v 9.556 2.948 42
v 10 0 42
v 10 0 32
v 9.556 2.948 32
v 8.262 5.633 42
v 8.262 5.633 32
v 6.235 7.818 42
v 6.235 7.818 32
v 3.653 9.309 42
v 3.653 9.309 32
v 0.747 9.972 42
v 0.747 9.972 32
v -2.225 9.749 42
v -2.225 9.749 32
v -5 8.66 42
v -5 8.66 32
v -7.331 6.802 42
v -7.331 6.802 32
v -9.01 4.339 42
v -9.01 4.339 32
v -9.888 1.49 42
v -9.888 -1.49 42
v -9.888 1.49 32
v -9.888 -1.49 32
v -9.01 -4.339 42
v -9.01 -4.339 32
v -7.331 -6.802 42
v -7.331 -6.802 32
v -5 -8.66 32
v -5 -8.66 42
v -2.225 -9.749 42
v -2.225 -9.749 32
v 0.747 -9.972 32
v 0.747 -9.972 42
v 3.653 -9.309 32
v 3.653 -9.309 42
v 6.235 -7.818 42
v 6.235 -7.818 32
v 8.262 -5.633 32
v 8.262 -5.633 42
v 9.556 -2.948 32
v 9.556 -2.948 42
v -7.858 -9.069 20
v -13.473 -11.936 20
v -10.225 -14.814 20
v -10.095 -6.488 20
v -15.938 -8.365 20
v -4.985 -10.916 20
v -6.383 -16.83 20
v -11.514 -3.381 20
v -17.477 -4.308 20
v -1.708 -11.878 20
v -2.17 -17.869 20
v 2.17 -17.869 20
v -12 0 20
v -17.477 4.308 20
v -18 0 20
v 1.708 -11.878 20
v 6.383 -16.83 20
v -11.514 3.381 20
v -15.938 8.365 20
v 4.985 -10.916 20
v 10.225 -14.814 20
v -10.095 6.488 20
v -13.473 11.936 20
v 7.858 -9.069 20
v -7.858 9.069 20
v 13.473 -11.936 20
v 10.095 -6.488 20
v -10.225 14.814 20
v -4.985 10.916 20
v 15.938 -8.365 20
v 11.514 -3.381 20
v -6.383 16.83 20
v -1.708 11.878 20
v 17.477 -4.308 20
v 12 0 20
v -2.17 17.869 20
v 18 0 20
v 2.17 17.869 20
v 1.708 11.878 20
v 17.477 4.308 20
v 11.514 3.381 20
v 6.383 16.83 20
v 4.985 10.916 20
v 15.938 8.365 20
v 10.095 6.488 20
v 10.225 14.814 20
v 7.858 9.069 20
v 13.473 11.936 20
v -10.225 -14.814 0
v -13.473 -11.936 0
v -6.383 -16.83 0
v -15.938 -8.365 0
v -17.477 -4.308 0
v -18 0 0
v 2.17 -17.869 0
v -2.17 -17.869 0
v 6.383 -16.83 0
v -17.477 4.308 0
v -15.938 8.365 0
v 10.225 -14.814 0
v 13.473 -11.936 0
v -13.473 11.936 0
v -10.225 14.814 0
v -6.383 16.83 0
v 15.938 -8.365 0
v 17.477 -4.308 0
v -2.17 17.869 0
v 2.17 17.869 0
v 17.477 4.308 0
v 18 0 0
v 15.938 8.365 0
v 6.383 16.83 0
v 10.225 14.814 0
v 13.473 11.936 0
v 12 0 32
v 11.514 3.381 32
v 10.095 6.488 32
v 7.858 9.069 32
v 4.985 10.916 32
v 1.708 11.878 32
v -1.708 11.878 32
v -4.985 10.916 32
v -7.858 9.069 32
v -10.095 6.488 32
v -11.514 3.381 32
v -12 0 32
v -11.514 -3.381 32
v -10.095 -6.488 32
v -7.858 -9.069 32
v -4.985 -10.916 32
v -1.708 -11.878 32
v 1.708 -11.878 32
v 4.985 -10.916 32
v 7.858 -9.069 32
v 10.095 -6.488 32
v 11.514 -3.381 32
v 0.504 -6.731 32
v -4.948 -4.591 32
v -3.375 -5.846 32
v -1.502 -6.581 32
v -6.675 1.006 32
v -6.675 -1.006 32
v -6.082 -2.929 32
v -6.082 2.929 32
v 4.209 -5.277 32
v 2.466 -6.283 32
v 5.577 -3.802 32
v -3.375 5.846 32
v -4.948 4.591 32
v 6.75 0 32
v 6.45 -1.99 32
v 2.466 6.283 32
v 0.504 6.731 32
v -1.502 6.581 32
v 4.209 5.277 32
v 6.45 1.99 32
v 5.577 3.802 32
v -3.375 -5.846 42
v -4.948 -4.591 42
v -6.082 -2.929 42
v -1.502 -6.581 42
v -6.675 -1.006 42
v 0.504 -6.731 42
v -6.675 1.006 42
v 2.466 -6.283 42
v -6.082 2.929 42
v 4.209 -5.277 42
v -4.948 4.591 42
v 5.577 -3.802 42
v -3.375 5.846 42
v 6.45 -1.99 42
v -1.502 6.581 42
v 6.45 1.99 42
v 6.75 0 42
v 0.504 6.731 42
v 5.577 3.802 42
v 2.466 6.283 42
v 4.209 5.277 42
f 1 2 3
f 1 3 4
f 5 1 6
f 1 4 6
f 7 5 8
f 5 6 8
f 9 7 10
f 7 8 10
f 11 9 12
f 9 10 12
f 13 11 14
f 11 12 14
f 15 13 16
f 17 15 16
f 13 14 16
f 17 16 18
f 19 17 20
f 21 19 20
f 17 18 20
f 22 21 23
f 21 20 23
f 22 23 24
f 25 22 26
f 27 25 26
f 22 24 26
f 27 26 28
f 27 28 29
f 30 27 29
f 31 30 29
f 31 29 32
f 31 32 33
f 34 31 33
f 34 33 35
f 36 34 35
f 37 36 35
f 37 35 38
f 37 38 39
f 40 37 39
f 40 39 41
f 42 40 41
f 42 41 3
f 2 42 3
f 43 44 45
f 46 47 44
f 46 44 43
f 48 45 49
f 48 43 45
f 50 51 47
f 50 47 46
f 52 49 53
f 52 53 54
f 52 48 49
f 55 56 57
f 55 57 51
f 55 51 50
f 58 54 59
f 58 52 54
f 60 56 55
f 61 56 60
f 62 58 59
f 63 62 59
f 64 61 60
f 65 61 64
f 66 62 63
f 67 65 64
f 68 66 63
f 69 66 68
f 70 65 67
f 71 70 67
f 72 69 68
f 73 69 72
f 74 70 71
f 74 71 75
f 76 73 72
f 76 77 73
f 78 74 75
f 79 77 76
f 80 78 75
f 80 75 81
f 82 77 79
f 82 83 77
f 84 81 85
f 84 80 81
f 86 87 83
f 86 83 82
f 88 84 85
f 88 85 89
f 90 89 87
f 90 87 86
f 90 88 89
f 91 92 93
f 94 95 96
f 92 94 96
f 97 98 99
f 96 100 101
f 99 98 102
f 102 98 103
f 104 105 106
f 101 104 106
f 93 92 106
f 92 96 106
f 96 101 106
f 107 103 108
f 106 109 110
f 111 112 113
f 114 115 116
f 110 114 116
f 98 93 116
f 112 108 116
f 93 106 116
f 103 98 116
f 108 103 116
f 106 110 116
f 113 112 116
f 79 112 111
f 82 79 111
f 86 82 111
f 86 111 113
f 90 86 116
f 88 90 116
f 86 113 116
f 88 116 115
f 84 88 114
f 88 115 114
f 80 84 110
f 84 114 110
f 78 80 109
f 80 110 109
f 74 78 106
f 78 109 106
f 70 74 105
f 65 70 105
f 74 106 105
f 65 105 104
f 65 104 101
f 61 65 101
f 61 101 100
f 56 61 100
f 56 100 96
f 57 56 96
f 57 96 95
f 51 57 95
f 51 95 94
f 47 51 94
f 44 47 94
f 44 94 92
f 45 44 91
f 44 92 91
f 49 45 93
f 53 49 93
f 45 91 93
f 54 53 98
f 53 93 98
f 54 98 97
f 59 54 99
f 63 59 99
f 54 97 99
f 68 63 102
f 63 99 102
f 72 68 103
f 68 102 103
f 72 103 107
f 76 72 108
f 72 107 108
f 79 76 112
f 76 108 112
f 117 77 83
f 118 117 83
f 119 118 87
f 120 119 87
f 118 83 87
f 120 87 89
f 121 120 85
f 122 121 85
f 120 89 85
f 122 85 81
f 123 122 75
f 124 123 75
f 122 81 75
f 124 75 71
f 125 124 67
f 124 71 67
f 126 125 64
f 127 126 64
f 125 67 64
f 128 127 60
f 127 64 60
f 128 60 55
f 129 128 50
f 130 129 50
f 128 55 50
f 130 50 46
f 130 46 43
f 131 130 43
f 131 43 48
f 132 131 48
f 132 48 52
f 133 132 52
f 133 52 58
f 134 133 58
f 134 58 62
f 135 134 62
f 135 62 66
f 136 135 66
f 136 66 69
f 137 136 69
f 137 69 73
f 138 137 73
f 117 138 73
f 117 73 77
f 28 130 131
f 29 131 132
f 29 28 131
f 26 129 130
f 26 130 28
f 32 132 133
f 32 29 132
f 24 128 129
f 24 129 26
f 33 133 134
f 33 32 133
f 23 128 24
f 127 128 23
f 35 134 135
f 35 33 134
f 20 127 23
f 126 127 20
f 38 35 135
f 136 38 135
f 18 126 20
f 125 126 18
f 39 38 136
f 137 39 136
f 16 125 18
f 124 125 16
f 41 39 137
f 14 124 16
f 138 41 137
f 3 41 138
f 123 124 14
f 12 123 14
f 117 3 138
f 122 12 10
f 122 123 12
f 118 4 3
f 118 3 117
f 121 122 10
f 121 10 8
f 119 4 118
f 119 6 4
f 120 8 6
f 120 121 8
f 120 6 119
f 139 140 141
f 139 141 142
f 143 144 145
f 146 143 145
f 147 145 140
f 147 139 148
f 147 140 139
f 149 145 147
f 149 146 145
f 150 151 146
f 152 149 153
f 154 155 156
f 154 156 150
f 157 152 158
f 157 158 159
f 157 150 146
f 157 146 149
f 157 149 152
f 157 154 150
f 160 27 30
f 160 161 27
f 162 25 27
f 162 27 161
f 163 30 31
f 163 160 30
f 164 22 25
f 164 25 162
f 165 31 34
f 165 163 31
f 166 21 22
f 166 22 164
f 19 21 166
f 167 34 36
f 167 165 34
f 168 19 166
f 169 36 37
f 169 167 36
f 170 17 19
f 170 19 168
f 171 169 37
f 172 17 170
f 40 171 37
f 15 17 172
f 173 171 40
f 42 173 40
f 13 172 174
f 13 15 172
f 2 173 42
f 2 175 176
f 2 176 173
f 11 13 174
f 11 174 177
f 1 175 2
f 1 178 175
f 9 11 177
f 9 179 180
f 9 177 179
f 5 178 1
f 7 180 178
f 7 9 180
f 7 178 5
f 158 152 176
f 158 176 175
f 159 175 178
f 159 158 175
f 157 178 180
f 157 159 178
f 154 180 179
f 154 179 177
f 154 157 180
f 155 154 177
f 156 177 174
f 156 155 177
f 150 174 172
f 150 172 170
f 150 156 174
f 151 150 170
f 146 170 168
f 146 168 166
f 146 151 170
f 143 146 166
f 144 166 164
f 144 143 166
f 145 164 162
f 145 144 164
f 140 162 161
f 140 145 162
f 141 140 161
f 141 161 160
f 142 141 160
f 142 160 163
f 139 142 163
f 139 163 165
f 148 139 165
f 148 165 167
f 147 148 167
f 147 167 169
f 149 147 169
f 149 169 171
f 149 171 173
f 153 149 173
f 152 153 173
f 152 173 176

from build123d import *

# Parameters (mm, degrees)
F0_R     = 10
F0_R_2   = 6.75
F1_DEPTH = 42
F0_R_3   = 12
F2_DEPTH = 32
F0_R_4   = 18
F3_DEPTH = 20


with BuildPart() as f1:
    # F0 (on Top) → F1 (new body)
    with BuildSketch(Plane.XY):
        Circle(F0_R)
        Circle(F0_R_2, mode=Mode.SUBTRACT)
    extrude(amount=F1_DEPTH)

    # F0 (on Top) → F2 (join)
    with BuildSketch(Plane.XY):
        Circle(F0_R_3)
        Circle(F0_R, mode=Mode.SUBTRACT)
        Circle(F0_R_2)
    extrude(amount=F2_DEPTH)

    # F0 (on Top) → F3 (join)
    with BuildSketch(Plane.XY):
        Circle(F0_R_4)
        Circle(F0_R_3, mode=Mode.SUBTRACT)
    extrude(amount=F3_DEPTH)


solid = f1.part
